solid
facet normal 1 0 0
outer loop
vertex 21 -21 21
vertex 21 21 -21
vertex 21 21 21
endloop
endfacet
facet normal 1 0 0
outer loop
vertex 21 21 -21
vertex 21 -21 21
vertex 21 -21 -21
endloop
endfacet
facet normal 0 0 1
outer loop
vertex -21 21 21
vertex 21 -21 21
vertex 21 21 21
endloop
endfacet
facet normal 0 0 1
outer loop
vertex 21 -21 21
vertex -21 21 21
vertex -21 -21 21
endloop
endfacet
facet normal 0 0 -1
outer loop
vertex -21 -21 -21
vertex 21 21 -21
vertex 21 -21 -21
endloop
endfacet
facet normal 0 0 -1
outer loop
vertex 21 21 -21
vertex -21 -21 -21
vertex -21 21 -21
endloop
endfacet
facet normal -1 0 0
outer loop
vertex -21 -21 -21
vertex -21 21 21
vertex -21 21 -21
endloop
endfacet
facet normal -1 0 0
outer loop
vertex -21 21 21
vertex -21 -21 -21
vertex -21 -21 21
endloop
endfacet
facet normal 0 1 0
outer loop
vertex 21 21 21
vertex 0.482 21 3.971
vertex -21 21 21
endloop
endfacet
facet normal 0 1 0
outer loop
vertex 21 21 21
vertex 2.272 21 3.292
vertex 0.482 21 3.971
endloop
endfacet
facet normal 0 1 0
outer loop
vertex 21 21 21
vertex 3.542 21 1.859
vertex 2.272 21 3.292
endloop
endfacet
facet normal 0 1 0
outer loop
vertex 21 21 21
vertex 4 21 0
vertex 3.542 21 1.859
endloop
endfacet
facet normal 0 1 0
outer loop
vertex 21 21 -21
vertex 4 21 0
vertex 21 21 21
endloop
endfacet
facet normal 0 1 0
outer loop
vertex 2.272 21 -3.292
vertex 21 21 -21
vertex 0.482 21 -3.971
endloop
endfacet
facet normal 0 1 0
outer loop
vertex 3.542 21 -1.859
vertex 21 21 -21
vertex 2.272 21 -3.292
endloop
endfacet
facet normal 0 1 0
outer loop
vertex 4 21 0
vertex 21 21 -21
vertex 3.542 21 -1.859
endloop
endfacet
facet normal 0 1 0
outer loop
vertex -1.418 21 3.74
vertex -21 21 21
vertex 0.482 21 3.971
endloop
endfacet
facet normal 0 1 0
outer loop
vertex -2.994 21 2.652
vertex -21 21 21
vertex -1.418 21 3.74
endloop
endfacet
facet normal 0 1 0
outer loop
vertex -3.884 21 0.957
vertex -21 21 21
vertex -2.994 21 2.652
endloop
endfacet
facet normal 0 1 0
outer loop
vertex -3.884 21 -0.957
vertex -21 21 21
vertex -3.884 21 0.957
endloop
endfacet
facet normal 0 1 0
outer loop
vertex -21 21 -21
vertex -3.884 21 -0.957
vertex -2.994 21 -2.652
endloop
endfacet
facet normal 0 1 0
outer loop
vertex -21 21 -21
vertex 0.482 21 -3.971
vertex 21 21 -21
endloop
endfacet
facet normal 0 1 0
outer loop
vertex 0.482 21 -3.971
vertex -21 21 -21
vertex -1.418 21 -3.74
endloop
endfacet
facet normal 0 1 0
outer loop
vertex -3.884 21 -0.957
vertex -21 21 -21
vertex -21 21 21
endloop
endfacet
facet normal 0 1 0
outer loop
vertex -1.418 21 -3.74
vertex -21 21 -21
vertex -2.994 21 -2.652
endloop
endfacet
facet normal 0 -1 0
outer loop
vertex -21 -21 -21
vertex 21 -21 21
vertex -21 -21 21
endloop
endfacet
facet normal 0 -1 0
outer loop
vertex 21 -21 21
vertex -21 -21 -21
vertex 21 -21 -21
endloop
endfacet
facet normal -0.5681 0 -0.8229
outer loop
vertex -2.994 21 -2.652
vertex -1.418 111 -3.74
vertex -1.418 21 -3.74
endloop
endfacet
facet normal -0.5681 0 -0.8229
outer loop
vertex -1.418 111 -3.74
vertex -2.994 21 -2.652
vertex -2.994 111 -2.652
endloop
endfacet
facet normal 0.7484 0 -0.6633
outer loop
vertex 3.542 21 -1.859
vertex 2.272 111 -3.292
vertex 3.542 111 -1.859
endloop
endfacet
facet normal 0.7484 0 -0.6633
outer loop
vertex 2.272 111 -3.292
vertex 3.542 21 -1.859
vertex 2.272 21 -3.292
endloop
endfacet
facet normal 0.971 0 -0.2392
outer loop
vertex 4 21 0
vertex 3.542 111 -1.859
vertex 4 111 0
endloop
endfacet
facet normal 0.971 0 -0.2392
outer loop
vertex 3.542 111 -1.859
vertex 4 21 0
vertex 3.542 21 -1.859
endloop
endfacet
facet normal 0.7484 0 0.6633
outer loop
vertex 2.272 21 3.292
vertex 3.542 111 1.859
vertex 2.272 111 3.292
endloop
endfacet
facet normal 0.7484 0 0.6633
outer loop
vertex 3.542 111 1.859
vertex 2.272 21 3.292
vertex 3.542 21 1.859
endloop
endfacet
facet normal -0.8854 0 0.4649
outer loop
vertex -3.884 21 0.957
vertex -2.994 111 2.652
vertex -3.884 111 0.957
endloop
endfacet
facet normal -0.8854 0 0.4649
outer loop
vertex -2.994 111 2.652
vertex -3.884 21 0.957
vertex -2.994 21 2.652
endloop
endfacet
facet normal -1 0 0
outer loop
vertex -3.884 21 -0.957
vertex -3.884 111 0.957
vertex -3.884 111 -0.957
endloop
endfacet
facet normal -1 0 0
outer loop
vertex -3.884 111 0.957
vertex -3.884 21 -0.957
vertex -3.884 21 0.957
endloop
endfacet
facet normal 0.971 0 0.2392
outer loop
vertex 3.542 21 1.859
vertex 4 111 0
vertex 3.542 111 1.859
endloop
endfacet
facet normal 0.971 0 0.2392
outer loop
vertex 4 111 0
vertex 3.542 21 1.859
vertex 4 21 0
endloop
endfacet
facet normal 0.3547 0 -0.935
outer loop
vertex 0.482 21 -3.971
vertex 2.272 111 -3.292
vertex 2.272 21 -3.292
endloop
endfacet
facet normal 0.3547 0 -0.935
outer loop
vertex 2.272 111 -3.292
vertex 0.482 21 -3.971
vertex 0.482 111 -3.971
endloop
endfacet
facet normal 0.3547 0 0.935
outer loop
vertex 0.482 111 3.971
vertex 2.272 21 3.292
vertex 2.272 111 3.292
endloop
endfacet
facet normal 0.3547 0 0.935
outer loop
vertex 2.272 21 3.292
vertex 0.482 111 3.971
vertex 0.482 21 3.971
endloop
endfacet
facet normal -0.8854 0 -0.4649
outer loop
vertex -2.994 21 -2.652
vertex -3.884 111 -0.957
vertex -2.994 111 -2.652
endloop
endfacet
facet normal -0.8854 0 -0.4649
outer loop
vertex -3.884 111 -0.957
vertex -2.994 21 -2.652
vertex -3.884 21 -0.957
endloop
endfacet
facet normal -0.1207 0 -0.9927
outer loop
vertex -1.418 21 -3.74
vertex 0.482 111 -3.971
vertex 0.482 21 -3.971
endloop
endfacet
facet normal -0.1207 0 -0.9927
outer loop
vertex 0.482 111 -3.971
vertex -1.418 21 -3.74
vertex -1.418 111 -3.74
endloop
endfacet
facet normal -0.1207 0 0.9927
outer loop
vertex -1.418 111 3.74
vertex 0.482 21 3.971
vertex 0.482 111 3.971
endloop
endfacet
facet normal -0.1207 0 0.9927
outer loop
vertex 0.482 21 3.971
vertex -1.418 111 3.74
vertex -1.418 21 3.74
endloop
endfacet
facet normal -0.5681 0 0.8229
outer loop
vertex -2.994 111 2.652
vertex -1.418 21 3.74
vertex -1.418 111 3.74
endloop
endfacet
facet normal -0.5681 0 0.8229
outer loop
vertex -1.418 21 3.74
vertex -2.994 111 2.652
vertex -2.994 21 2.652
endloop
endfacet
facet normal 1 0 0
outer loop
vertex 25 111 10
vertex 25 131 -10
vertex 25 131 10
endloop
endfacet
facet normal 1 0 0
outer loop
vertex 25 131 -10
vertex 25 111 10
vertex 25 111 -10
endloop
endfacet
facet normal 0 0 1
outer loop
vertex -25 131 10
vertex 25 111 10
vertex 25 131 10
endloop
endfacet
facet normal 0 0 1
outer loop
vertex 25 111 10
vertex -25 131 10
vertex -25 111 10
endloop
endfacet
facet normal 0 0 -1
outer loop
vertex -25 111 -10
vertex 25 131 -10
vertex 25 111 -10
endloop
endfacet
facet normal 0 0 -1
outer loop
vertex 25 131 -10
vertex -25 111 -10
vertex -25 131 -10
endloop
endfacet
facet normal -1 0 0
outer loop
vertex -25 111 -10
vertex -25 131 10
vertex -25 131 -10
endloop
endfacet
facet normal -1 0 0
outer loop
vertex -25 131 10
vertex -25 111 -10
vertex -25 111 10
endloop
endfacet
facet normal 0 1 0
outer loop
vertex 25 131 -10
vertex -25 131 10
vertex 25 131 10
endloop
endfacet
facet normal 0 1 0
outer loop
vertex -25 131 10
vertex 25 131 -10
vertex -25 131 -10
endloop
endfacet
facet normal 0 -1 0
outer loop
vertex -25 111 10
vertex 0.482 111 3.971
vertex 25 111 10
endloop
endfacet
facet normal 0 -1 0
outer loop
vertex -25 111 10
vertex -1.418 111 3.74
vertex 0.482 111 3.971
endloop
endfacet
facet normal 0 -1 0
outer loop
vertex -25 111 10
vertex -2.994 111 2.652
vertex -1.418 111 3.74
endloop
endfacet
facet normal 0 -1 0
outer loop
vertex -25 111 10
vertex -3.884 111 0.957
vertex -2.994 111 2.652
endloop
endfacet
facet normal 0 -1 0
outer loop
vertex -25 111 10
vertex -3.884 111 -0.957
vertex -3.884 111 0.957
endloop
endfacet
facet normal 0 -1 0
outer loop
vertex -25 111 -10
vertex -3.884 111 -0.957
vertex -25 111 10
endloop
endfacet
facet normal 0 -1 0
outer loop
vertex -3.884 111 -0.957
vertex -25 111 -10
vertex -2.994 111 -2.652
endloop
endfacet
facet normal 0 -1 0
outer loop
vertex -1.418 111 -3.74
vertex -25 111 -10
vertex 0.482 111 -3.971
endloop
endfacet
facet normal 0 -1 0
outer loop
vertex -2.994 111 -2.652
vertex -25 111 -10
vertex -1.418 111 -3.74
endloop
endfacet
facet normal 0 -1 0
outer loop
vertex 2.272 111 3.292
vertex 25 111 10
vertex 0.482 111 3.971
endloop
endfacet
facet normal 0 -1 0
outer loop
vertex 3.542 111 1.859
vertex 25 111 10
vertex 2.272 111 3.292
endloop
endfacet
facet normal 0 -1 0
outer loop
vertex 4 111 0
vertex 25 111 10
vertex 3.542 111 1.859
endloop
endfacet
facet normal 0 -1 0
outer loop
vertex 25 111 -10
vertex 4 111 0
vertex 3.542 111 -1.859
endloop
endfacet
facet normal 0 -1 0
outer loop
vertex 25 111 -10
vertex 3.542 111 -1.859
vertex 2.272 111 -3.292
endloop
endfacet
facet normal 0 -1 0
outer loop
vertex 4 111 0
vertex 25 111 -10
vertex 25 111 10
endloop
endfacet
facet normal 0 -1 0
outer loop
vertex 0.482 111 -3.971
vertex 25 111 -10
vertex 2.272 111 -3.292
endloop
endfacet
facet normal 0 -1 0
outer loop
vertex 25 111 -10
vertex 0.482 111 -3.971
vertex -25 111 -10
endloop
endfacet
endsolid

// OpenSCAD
module nema_mount(center) {
    cube([42, 42, 42], center=center);
}
module guide_rods_and_screw(travel_dist) {
    cylinder(r=4, h=travel_dist);
}
module sliding_carriage(carriage_length, center) {
    cube([50, carriage_length, 20], center=center);
}

module linear_actuator(travel_dist, rod_spacing, carriage_length, is_assembly=true)
{
    assert(travel_dist>0 && rod_spacing>0 && carriage_length>0, "Negative Input");
    assert(travel_dist>carriage_length, "carriage can't be longer than travel distance");
    

    nema_mount(center=is_assembly);

    if (is_assembly)
    {
        translate([0,21,0]) // just simply cuz the nema_mount is 42. only example
        rotate([-90,0,0])
        guide_rods_and_screw(travel_dist);
    }

    _v = (is_assembly) ? [0,travel_dist / 2 * cos($t * 360) + 21 + travel_dist/2,0] : [rod_spacing, 0, 0];

    translate(_v)
    sliding_carriage(carriage_length, center=is_assembly);
}

linear_actuator(100, 50, 20);
